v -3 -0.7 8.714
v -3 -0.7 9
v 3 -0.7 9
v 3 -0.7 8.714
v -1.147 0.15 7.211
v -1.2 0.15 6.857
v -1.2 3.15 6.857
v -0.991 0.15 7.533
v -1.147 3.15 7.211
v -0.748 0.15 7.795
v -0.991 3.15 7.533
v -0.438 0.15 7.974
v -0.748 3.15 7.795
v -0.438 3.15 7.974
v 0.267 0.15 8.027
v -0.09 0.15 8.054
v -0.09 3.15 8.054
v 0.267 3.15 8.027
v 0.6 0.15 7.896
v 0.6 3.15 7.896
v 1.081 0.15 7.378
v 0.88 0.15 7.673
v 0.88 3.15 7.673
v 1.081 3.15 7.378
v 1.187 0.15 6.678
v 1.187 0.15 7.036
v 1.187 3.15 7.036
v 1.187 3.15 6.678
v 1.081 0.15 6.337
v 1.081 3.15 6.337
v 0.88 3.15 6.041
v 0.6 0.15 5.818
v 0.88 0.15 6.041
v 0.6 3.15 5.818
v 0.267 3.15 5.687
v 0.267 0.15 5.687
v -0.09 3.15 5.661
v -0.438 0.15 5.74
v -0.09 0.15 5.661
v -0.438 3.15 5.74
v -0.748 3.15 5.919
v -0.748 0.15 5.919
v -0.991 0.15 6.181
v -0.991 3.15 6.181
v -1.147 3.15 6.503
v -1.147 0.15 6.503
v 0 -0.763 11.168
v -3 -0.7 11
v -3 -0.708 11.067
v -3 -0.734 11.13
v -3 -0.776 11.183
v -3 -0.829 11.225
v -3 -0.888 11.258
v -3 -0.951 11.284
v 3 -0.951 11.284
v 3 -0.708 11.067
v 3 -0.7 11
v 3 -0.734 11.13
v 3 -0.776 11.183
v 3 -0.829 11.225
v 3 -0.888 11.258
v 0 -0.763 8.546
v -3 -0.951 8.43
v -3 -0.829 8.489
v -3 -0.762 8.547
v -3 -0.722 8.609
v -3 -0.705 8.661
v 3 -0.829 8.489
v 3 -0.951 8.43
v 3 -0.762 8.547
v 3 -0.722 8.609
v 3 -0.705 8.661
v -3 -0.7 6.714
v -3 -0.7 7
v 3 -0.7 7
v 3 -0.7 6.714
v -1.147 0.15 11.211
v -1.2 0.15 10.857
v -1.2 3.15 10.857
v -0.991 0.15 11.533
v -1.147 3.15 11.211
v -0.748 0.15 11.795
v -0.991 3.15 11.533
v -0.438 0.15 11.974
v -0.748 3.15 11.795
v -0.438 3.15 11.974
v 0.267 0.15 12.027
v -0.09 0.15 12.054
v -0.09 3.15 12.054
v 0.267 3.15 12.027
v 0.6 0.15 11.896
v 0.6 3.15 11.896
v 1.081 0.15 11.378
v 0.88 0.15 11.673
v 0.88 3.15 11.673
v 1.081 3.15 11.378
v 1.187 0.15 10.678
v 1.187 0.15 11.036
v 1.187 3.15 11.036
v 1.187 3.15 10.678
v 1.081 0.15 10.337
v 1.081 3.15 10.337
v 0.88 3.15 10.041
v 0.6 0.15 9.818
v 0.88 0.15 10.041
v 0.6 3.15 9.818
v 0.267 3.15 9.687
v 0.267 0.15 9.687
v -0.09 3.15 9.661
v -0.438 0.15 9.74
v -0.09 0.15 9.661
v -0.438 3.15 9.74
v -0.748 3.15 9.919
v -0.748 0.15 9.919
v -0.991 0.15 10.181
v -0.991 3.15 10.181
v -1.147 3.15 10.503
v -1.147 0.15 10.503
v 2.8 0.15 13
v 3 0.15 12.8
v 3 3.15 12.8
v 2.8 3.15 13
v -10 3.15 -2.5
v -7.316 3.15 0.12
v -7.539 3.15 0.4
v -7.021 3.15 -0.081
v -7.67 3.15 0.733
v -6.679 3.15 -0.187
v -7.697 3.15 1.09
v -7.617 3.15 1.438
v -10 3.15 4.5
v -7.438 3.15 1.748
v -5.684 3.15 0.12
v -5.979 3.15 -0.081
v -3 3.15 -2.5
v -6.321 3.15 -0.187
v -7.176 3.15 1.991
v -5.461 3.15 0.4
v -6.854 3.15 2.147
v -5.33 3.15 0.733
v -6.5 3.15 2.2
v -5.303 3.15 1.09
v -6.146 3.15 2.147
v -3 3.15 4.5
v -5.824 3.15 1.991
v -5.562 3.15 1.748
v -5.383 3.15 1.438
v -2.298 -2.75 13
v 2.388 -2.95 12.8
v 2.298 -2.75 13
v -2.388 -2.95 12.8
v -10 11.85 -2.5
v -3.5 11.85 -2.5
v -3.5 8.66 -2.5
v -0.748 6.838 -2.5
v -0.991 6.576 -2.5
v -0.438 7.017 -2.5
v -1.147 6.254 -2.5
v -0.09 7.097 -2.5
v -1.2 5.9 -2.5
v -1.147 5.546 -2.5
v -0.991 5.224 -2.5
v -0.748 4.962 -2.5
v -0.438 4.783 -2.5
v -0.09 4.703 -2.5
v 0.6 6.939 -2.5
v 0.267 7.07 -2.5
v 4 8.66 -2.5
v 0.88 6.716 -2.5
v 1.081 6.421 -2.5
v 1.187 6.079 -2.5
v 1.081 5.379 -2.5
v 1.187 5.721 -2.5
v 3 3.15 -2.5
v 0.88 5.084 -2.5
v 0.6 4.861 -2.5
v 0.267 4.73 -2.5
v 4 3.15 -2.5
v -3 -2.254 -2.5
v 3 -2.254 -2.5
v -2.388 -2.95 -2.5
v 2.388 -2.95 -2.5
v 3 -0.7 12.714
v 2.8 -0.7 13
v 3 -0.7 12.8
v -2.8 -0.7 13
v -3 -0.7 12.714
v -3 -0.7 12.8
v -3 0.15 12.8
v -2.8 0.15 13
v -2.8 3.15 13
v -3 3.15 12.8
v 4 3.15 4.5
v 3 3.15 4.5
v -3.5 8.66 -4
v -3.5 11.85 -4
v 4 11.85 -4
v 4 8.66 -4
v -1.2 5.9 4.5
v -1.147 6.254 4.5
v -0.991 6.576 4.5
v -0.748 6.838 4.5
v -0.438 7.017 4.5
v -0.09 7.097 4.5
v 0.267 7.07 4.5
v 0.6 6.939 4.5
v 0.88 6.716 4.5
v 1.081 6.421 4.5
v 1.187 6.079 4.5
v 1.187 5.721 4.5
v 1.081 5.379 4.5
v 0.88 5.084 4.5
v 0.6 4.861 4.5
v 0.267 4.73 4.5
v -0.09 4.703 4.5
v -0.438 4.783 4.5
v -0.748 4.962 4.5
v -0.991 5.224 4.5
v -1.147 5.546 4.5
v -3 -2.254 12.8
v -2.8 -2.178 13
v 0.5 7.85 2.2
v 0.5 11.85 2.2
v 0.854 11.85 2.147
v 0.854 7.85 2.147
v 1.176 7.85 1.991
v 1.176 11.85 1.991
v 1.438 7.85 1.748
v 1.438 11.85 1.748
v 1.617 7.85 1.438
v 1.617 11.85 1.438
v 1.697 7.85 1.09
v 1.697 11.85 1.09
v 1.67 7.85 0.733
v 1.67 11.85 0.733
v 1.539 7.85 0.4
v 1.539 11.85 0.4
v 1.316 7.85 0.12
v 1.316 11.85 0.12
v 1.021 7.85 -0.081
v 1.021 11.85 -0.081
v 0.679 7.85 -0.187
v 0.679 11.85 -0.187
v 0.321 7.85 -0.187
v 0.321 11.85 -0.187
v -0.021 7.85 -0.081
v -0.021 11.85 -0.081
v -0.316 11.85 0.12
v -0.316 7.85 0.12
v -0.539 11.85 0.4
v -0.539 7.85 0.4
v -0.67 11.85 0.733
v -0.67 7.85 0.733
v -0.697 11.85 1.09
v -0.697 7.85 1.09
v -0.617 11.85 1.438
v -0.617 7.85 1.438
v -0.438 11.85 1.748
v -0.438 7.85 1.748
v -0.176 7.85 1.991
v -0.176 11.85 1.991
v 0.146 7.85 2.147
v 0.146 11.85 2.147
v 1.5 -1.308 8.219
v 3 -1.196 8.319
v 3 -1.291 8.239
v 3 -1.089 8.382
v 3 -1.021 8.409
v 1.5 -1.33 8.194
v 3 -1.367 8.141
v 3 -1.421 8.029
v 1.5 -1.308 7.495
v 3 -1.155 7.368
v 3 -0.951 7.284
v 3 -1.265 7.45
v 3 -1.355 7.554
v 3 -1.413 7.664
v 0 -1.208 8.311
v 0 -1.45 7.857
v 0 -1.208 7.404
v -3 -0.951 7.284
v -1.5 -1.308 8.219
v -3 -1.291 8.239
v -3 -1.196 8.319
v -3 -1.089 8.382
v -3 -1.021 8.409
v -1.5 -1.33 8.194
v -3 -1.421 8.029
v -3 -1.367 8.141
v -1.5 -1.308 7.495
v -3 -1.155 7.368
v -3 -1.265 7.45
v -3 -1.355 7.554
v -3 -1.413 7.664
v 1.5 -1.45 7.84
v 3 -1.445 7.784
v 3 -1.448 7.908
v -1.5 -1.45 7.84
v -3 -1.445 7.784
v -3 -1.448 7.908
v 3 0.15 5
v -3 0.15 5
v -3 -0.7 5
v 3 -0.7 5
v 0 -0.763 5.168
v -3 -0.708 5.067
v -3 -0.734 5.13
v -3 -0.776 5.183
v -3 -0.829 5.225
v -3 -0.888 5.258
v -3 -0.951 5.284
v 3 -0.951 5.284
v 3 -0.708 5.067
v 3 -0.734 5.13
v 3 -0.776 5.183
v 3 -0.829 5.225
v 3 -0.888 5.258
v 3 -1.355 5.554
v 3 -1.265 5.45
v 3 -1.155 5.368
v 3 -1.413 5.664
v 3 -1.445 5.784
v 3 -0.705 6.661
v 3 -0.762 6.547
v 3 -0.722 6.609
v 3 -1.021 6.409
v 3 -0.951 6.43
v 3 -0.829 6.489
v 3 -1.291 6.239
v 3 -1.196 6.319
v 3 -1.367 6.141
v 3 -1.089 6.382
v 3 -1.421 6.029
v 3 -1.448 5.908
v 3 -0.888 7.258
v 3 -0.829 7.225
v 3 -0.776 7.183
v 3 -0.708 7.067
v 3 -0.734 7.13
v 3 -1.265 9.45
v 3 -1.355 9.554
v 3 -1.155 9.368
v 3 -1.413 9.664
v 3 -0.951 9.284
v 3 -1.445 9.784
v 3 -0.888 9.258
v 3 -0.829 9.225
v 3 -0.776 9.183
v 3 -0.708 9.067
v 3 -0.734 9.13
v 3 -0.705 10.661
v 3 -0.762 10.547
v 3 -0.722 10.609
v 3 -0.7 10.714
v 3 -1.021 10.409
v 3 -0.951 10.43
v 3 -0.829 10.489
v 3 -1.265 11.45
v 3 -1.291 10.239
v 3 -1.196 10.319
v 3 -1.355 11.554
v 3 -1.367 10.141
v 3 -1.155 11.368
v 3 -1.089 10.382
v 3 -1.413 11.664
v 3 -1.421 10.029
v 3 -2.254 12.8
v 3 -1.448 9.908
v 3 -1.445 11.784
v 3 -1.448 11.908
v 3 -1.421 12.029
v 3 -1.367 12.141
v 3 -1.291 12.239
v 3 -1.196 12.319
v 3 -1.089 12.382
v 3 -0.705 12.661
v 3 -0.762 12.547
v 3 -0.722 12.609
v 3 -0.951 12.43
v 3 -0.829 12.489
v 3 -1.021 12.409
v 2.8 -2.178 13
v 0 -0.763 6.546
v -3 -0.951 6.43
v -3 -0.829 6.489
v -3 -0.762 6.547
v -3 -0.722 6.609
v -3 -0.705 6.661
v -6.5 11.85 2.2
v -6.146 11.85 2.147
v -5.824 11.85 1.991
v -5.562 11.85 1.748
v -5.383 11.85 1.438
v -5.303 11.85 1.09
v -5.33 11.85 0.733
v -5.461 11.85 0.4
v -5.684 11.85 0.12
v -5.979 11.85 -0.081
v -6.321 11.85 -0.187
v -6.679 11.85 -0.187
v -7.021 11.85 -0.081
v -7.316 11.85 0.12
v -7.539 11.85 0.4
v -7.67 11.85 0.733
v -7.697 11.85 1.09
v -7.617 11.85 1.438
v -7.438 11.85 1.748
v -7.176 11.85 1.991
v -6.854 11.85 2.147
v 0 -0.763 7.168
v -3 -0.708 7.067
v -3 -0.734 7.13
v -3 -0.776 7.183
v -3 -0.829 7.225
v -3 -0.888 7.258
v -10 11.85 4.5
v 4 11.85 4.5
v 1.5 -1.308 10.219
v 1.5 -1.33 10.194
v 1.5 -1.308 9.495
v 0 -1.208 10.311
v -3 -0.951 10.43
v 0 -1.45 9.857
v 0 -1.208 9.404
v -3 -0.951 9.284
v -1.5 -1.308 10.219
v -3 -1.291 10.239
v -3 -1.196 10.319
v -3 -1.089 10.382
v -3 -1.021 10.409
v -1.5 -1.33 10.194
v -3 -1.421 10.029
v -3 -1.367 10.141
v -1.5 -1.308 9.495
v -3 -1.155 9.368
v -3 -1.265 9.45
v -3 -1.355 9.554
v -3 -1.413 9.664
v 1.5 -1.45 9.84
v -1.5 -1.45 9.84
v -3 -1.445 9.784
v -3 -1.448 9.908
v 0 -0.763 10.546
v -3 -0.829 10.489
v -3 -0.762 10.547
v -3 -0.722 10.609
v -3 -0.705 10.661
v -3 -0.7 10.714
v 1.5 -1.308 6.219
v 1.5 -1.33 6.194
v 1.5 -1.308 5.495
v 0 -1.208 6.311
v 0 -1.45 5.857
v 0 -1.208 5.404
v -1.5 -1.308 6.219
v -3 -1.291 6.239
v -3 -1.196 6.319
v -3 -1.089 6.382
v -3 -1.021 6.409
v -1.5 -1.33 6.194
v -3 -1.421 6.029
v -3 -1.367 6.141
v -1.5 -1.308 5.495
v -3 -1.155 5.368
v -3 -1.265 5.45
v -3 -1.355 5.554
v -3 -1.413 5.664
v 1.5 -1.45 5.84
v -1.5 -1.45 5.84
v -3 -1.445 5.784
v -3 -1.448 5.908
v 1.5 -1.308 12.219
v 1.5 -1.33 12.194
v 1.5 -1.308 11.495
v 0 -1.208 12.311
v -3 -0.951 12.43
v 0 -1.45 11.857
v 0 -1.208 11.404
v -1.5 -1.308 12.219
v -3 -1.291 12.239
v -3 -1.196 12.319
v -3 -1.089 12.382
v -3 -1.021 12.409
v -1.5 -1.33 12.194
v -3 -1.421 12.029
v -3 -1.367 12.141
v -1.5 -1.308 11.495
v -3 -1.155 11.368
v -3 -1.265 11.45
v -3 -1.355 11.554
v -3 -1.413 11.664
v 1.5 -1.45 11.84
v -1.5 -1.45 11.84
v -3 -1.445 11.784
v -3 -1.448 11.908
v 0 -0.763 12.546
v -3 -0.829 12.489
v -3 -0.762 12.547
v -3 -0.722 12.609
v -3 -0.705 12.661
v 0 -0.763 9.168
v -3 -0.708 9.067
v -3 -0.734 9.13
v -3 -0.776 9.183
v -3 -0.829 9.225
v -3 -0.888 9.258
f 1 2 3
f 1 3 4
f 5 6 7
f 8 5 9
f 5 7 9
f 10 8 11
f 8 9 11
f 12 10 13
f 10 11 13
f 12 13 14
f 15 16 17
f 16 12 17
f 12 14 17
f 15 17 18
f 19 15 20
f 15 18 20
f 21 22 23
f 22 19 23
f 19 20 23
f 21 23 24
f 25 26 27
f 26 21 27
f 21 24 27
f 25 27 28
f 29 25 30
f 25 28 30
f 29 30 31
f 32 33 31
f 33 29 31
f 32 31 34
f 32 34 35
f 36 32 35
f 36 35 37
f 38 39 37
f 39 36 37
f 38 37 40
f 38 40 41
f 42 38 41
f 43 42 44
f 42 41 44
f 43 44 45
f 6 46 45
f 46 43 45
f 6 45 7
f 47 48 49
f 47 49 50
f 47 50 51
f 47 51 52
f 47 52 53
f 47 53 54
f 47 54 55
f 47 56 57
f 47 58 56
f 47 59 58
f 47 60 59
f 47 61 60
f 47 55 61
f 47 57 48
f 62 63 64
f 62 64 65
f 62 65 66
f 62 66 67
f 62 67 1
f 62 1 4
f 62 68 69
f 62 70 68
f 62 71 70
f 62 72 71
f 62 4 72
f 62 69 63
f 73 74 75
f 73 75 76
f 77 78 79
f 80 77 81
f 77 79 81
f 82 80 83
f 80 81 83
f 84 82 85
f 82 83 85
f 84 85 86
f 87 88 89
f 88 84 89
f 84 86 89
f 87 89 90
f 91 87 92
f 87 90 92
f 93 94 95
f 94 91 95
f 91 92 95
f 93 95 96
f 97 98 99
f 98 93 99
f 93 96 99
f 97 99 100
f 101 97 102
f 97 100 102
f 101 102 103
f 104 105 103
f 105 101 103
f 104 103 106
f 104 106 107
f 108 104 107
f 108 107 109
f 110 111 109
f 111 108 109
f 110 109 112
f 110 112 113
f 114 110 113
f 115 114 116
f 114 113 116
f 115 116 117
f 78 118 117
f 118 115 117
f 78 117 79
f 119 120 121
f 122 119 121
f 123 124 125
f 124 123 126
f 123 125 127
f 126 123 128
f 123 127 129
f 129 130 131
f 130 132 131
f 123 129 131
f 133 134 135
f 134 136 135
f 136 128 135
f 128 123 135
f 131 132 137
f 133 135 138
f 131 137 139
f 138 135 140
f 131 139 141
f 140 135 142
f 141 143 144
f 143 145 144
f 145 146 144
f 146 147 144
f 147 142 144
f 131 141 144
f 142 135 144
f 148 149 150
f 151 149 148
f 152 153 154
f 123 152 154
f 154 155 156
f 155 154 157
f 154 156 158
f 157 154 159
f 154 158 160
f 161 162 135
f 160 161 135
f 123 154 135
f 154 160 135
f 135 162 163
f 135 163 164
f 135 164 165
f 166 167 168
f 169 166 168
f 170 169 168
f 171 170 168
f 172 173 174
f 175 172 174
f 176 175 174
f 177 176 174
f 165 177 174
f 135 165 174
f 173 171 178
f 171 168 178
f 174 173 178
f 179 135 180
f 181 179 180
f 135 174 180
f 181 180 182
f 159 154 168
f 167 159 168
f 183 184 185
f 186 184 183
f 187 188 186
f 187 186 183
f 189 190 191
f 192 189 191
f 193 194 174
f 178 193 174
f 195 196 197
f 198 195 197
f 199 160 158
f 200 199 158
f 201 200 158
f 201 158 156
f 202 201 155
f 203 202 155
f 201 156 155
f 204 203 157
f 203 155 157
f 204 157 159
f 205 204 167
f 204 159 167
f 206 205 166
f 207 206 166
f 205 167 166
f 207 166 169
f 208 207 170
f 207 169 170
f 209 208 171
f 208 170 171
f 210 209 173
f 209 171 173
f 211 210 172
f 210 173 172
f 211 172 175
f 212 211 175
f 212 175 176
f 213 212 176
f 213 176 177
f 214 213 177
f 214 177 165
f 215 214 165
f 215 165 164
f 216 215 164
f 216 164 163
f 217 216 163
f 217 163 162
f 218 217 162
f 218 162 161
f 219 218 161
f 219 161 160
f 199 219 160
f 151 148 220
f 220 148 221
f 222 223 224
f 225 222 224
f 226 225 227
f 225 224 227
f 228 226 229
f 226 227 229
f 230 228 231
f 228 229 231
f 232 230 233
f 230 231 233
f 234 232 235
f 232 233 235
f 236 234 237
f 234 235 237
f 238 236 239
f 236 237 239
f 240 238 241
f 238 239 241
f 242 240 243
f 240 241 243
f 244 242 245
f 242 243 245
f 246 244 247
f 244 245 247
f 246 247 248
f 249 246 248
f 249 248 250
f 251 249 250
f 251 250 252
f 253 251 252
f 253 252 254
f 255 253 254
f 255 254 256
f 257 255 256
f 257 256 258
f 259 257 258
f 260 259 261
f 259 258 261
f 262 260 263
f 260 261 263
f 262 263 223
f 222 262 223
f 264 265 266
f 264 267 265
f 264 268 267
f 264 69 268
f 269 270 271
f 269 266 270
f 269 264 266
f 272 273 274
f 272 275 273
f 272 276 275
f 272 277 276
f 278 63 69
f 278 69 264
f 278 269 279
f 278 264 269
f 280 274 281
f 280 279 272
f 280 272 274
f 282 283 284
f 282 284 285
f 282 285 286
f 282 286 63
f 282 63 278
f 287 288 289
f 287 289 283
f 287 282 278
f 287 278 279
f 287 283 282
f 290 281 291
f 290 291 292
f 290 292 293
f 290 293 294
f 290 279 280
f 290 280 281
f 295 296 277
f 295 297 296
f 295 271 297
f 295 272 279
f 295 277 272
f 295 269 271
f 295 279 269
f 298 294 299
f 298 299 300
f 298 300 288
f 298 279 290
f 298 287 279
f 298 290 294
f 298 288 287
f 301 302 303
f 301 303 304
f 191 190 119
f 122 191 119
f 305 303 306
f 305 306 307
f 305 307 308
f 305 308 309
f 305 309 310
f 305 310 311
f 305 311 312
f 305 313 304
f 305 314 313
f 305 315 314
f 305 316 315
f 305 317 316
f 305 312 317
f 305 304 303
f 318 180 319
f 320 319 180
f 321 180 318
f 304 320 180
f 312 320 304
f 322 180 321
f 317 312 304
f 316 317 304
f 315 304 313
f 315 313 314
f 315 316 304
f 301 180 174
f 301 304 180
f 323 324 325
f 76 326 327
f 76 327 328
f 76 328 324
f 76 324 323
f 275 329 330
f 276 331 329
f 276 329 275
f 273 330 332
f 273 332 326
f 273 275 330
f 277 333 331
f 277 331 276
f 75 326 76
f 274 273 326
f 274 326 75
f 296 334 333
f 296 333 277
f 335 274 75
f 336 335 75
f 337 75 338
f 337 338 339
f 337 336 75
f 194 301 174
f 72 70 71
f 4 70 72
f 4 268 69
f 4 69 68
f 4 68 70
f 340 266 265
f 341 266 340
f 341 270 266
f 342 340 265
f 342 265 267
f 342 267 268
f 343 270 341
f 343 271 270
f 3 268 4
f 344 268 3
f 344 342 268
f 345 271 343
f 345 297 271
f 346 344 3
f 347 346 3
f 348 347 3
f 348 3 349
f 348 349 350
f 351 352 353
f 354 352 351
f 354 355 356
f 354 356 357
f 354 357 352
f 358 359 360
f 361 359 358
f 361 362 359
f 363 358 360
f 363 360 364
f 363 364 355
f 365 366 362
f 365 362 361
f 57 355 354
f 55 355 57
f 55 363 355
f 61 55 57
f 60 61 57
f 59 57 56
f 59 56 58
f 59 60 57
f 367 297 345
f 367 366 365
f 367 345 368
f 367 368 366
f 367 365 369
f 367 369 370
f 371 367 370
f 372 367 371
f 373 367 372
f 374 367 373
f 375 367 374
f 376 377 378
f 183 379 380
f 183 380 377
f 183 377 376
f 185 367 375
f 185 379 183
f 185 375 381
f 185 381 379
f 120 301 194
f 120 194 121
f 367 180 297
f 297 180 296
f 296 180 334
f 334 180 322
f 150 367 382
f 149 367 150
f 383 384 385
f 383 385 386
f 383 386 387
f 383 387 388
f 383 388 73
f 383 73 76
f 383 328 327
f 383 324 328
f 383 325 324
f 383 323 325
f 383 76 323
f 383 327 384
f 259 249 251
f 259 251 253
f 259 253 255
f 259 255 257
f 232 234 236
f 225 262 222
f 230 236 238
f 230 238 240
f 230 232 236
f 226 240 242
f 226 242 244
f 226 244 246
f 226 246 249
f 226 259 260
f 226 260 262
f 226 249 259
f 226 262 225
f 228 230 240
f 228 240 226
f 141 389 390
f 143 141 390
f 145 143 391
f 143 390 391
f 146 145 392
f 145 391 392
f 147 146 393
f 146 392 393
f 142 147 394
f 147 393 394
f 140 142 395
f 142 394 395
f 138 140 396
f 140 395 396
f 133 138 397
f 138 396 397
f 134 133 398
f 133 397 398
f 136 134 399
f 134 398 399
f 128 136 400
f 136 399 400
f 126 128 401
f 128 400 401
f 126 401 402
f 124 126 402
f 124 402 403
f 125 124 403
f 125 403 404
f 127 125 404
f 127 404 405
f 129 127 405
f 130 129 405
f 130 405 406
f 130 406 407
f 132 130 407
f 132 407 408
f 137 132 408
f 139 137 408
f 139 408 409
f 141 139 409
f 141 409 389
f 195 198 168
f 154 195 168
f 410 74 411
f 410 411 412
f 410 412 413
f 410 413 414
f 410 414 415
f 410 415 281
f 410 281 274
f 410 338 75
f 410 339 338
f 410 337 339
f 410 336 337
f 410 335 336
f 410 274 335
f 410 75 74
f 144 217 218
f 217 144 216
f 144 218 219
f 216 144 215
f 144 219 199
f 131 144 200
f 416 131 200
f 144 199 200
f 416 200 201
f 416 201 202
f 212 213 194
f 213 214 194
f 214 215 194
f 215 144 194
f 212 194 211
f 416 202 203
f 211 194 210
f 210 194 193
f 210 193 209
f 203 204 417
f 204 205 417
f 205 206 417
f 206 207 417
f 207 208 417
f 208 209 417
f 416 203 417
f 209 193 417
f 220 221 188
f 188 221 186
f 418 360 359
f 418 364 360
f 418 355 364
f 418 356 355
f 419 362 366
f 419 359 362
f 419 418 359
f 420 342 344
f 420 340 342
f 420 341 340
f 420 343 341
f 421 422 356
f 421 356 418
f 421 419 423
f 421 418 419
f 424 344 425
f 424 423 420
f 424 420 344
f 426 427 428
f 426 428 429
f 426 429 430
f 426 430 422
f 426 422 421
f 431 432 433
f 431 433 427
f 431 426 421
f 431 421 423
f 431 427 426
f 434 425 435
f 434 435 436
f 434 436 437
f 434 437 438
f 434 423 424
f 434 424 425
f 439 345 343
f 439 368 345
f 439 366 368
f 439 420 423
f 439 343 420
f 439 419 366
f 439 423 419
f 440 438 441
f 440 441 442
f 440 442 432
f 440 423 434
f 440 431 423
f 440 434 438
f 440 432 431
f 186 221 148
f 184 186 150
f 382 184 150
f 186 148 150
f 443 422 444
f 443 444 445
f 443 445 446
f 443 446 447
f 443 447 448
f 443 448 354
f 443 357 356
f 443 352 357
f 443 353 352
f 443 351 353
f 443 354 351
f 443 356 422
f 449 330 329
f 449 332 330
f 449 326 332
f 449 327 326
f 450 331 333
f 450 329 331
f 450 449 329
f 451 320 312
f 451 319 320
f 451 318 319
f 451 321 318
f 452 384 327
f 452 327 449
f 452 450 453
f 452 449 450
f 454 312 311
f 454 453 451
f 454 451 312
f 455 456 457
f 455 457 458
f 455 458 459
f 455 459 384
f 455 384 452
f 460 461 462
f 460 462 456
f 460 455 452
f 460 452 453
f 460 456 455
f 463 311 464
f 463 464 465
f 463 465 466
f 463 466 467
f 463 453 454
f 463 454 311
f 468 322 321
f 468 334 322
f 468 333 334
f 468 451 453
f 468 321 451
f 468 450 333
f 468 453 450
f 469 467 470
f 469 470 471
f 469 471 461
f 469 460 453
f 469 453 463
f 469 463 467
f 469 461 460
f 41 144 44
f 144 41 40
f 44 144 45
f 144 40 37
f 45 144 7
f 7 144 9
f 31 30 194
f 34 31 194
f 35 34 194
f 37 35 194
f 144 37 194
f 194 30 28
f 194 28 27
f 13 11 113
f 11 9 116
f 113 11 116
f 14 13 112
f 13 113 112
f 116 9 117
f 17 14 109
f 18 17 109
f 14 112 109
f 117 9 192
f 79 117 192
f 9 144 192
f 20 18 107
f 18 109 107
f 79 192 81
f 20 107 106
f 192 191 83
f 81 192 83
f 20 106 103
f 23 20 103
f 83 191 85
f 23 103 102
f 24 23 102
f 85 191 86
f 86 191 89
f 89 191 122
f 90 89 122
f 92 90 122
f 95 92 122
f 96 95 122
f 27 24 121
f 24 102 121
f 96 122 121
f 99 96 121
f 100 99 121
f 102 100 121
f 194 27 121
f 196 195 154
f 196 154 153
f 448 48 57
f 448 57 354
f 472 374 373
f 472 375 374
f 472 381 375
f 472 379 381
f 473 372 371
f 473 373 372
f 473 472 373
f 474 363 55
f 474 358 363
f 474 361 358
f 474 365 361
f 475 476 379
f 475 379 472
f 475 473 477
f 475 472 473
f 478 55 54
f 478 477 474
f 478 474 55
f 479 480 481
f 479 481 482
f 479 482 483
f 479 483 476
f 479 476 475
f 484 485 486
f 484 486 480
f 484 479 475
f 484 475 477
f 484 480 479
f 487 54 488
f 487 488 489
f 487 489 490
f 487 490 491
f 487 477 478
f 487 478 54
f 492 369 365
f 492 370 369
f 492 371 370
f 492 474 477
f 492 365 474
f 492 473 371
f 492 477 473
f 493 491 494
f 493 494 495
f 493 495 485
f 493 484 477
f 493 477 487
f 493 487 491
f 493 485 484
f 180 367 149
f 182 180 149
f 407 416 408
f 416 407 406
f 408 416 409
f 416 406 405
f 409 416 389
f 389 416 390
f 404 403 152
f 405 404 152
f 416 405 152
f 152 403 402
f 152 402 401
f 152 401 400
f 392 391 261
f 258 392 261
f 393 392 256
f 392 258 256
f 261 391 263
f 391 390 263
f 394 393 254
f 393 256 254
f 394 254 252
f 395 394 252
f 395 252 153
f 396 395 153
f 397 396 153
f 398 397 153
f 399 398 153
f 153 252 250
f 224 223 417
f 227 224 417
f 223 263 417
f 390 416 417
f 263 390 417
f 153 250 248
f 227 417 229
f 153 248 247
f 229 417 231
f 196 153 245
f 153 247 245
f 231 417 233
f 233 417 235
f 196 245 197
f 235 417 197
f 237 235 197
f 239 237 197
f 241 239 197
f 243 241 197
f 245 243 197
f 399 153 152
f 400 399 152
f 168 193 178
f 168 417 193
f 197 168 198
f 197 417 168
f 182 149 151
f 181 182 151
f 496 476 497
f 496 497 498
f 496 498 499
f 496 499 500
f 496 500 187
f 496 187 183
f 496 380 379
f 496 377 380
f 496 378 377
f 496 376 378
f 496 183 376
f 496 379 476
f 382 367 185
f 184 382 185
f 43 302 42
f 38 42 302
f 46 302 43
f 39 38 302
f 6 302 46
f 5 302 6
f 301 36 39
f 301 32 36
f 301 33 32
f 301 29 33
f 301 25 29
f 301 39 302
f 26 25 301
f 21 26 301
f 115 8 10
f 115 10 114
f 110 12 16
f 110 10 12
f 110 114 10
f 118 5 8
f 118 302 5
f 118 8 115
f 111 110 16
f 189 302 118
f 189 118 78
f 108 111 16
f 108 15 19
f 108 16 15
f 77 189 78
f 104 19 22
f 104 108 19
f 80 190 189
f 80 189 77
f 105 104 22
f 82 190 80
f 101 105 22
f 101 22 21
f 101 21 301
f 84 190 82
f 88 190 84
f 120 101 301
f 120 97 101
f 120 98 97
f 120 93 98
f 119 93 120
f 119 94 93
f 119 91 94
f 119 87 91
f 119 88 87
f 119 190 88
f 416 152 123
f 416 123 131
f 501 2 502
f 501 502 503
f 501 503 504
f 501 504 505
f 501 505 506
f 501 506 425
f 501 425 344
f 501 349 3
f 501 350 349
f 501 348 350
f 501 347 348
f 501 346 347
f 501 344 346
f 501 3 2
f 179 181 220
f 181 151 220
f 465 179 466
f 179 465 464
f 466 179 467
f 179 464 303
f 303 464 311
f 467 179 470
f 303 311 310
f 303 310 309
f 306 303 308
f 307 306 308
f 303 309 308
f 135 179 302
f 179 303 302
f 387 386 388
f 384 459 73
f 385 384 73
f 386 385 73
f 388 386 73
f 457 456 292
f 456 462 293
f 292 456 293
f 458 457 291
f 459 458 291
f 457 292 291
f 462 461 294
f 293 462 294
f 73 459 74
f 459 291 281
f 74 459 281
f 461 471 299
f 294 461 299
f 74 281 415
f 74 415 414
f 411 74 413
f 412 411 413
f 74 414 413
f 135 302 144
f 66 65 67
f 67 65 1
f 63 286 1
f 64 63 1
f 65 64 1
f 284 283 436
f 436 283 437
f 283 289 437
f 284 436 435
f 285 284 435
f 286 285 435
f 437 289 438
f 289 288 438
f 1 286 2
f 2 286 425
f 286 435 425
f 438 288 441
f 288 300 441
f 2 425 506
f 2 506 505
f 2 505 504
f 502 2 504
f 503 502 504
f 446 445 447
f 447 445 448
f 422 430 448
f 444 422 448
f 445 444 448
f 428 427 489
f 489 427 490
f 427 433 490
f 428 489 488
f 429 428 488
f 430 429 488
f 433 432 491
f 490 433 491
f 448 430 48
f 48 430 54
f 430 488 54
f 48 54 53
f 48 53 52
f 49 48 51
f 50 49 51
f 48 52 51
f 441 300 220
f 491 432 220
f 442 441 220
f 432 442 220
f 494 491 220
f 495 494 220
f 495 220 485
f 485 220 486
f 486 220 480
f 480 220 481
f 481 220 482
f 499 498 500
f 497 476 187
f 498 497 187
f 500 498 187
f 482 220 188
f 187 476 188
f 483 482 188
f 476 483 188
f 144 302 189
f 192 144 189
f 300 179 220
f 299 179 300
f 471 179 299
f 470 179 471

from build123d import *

# Parameters (mm, degrees)
BOSS_EXTRUDE1_DEPTH     = 13
SKETCH6_W               = 6
SKETCH6_H               = 5
BOSS_EXTRUDE4_DEPTH     = 5.6
SKETCH16_W              = 6
SKETCH16_H              = 8
BOSS_EXTRUDE5_DEPTH     = 0.1
CUT_EXTRUDE6_DEPTH      = 4
CUT_EXTRUDE6_DEPTH_BACK = 3.6
SKETCH15_R              = 1.2
CUT_EXTRUDE7_DEPTH      = 8.7202
CUT_EXTRUDE8_START      = -0.2202
SKETCH19_W              = 6
SKETCH19_H              = 8
SKETCH19_R              = 1.2
CUT_EXTRUDE8_DEPTH      = 0.2202
SKETCH12_R              = 1.2
CUT_EXTRUDE5_DEPTH      = 6
CHAMFER1_SIZE           = 0.2
SKETCH21_R              = 1.2
BOSS_EXTRUDE6_DEPTH     = 2.5
SKETCH24_W              = 6
SKETCH24_H              = 5.5
CUT_EXTRUDE10_DEPTH     = 8.5
SKETCH25_W              = 6
SKETCH25_H              = 7
BOSS_EXTRUDE8_DEPTH     = 12.9
SKETCH26_W              = 6
SKETCH26_H              = 7.39
BOSS_EXTRUDE9_DEPTH     = 3
SKETCH30_R              = 1.2
CUT_EXTRUDE13_DEPTH     = 8
SKETCH31_W              = 7
SKETCH31_H              = 9
BOSS_EXTRUDE11_DEPTH    = 1
SKETCH32_W              = 7
SKETCH32_H              = 9
BOSS_EXTRUDE12_DEPTH    = 1
BOSS_EXTRUDE13_DEPTH    = 1
BOSS_EXTRUDE14_DEPTH    = 1
SKETCH35_W              = 10
SKETCH35_H              = 4.2
CUT_EXTRUDE14_DEPTH     = 10
BOSS_EXTRUDE15_DEPTH    = 6
SKETCH38_R              = 1.2
CUT_EXTRUDE15_DEPTH     = 4
SKETCH39_R              = 1.2
CUT_EXTRUDE16_DEPTH     = 10
SKETCH40_W              = 14
SKETCH40_H              = 1.5
CUT_EXTRUDE17_DEPTH     = 10
SKETCH41_W              = 6.5
SKETCH41_H              = 3.19
CUT_EXTRUDE18_DEPTH     = 1.5


with BuildPart() as part:
    # Sketch1 → Boss-Extrude1 (new body)
    with BuildSketch(Plane.XY):
        Polygon((3, 3.05), (3, -2.253801214), (2.388188946, -2.95), (-2.388188946, -2.95), (-3, -2.253801214), (-3, 3.05), align=None)
    extrude(amount=BOSS_EXTRUDE1_DEPTH)

    # Sketch6 → Boss-Extrude4 (add)
    with BuildSketch(Plane(origin=(0, 3.05, 0), x_dir=(1, 0, 0), z_dir=(0, 1, 0))):
        with Locations((0, -2.5)):
            Rectangle(SKETCH6_W, SKETCH6_H)
    extrude(amount=BOSS_EXTRUDE4_DEPTH)

    # Sketch16 → Boss-Extrude5 (add)
    with BuildSketch(Plane(origin=(0, 3.05, 0), x_dir=(1, 0, 0), z_dir=(0, 1, 0))):
        with Locations((0, -9)):
            Rectangle(SKETCH16_W, SKETCH16_H)
    extrude(amount=BOSS_EXTRUDE5_DEPTH)

    # Sketch18 → Cut-Extrude6 (cut, two sides: drawn at the far end of the back side and taken through both)
    with BuildSketch(Plane(origin=(0, 0, 0), x_dir=(0, 0, -1), z_dir=(1, 0, 0)).offset(-CUT_EXTRUDE6_DEPTH_BACK)):
        with BuildLine():
            Line((-8.8572, -0.0702), (-12.8572, -0.0702))
            Line((-12.8572, -0.0702), (-13, -0.0702))
            Line((-13, -0.0702), (-13, -0.7))
            Line((-13, -0.7), (-12.8572, -0.7))
            Line((-12.8572, -0.7), (-12.7144, -0.7))
            add(Edge.make_bspline(
                [(-12.7144, -0.7), (-12.5198, -0.7), (-12.43, -0.9509)],
                knots=[0.103448276, 0.103448276, 0.103448276, 0.137931034, 0.137931034, 0.137931034], degree=2))
            add(Edge.make_bspline(
                [(-12.43, -0.9509), (-12.3594, -1.2388), (-12.13, -1.45), (-11.8572, -1.45)],
                knots=[0.137931034, 0.137931034, 0.137931034, 0.137931034, 0.172413793, 0.172413793, 0.172413793, 0.172413793], degree=3))
            add(Edge.make_bspline(
                [(-11.8572, -1.45), (-11.5844, -1.45), (-11.355, -1.2388), (-11.2844, -0.9509)],
                knots=[0.172413793, 0.172413793, 0.172413793, 0.172413793, 0.206896552, 0.206896552, 0.206896552, 0.206896552], degree=3))
            add(Edge.make_bspline(
                [(-11.2844, -0.9509), (-11.1946, -0.7), (-11, -0.7)],
                knots=[0.206896552, 0.206896552, 0.206896552, 0.24137931, 0.24137931, 0.24137931], degree=2))
            Line((-11, -0.7), (-10.8572, -0.7))
            Line((-10.8572, -0.7), (-10.7144, -0.7))
            add(Edge.make_bspline(
                [(-10.7144, -0.7), (-10.5198, -0.7), (-10.43, -0.9509)],
                knots=[0.310344828, 0.310344828, 0.310344828, 0.344827586, 0.344827586, 0.344827586], degree=2))
            add(Edge.make_bspline(
                [(-10.43, -0.9509), (-10.3594, -1.2388), (-10.13, -1.45), (-9.8572, -1.45)],
                knots=[0.344827586, 0.344827586, 0.344827586, 0.344827586, 0.379310345, 0.379310345, 0.379310345, 0.379310345], degree=3))
            add(Edge.make_bspline(
                [(-9.8572, -1.45), (-9.5844, -1.45), (-9.355, -1.2388), (-9.2844, -0.9509)],
                knots=[0.379310345, 0.379310345, 0.379310345, 0.379310345, 0.413793103, 0.413793103, 0.413793103, 0.413793103], degree=3))
            add(Edge.make_bspline(
                [(-9.2844, -0.9509), (-9.1946, -0.7), (-9, -0.7)],
                knots=[0.413793103, 0.413793103, 0.413793103, 0.448275862, 0.448275862, 0.448275862], degree=2))
            Line((-9, -0.7), (-8.8572, -0.7))
            Line((-8.8572, -0.7), (-8.7144, -0.7))
            add(Edge.make_bspline(
                [(-8.7144, -0.7), (-8.5198, -0.7), (-8.43, -0.9509)],
                knots=[0.517241379, 0.517241379, 0.517241379, 0.551724138, 0.551724138, 0.551724138], degree=2))
            add(Edge.make_bspline(
                [(-8.43, -0.9509), (-8.3594, -1.2388), (-8.13, -1.45), (-7.8572, -1.45)],
                knots=[0.551724138, 0.551724138, 0.551724138, 0.551724138, 0.586206897, 0.586206897, 0.586206897, 0.586206897], degree=3))
            add(Edge.make_bspline(
                [(-7.8572, -1.45), (-7.5844, -1.45), (-7.355, -1.2388), (-7.2844, -0.9509)],
                knots=[0.586206897, 0.586206897, 0.586206897, 0.586206897, 0.620689655, 0.620689655, 0.620689655, 0.620689655], degree=3))
            add(Edge.make_bspline(
                [(-7.2844, -0.9509), (-7.1946, -0.7), (-7, -0.7)],
                knots=[0.620689655, 0.620689655, 0.620689655, 0.655172414, 0.655172414, 0.655172414], degree=2))
            Line((-7, -0.7), (-6.8572, -0.7))
            Line((-6.8572, -0.7), (-6.7144, -0.7))
            add(Edge.make_bspline(
                [(-6.7144, -0.7), (-6.5198, -0.7), (-6.43, -0.9509)],
                knots=[0.724137931, 0.724137931, 0.724137931, 0.75862069, 0.75862069, 0.75862069], degree=2))
            add(Edge.make_bspline(
                [(-6.43, -0.9509), (-6.3594, -1.2388), (-6.13, -1.45), (-5.8572, -1.45)],
                knots=[0.75862069, 0.75862069, 0.75862069, 0.75862069, 0.793103448, 0.793103448, 0.793103448, 0.793103448], degree=3))
            add(Edge.make_bspline(
                [(-5.8572, -1.45), (-5.5844, -1.45), (-5.355, -1.2388), (-5.2844, -0.9509)],
                knots=[0.793103448, 0.793103448, 0.793103448, 0.793103448, 0.827586207, 0.827586207, 0.827586207, 0.827586207], degree=3))
            add(Edge.make_bspline(
                [(-5.2844, -0.9509), (-5.1946, -0.7), (-5, -0.7)],
                knots=[0.827586207, 0.827586207, 0.827586207, 0.862068966, 0.862068966, 0.862068966], degree=2))
            Line((-5, -0.7), (-5, -0.0702))
            Line((-5, -0.0702), (-8.8572, -0.0702))
        make_face()
    extrude(amount=CUT_EXTRUDE6_DEPTH + CUT_EXTRUDE6_DEPTH_BACK, mode=Mode.SUBTRACT)

    # Sketch15 → Cut-Extrude7 (cut)
    with BuildSketch(Plane(origin=(0, 8.65, 0), x_dir=(1, 0, 0), z_dir=(0, 1, 0))):
        with Locations(Location((0, -10.8572, 0), (0, 0, 180))):
            Circle(SKETCH15_R)
        with Locations(Location((0, -6.8572, 0), (0, 0, 180))):
            Circle(SKETCH15_R)
    extrude(amount=-CUT_EXTRUDE7_DEPTH, mode=Mode.SUBTRACT)

    # Sketch19 → Cut-Extrude8 (cut)
    with BuildSketch(Plane.XZ.offset(0.0702).offset(CUT_EXTRUDE8_START)):
        with Locations((0, 9)):
            Rectangle(SKETCH19_W, SKETCH19_H)
        with Locations(Location((0, 10.8572, 0), (0, 0, 180))):
            Circle(SKETCH19_R, mode=Mode.SUBTRACT)
        with Locations(Location((0, 6.8572, 0), (0, 0, 180))):
            Circle(SKETCH19_R, mode=Mode.SUBTRACT)
    extrude(amount=CUT_EXTRUDE8_DEPTH, mode=Mode.SUBTRACT)

    # Sketch12 → Cut-Extrude5 (cut)
    with BuildSketch(Plane.XY.offset(5)):
        with Locations((0, 5.85)):
            Circle(SKETCH12_R)
    extrude(amount=-CUT_EXTRUDE5_DEPTH, mode=Mode.SUBTRACT)

    # Chamfer1
    chamfer1_edges = [part.edges().sort_by_distance(p)[0] for p in [
        (-2.694094473, -2.601900607, 13),
        (0, -2.95, 13),
        (2.694094473, -2.601900607, 13),
        (3, 1.65, 13),
        (3, -1.476900607, 13),
        (-3, -1.476900607, 13),
        (-3, 1.65, 13),
    ]]
    chamfer(chamfer1_edges, length=CHAMFER1_SIZE)

    # Sketch21 → Boss-Extrude6 (add)
    with BuildSketch(Plane(origin=(0, 0, 0), x_dir=(-1, 0, 0), z_dir=(0, 0, -1))):
        Polygon((-2.388188946, -2.95), (2.388188946, -2.95), (3, -2.253801214), (3, 8.65), (-3, 8.65), (-3, -2.253801214), align=None)
        with Locations(Location((0, 5.85, 0), (0, 0, 180))):
            Circle(SKETCH21_R, mode=Mode.SUBTRACT)
    extrude(amount=BOSS_EXTRUDE6_DEPTH)

    # Sketch24 → Cut-Extrude10 (cut)
    with BuildSketch(Plane.XY.offset(5)):
        with Locations((0, 5.9)):
            Rectangle(SKETCH24_W, SKETCH24_H)
    extrude(amount=-CUT_EXTRUDE10_DEPTH, mode=Mode.SUBTRACT)

    # Sketch25 → Boss-Extrude8 (add)
    with BuildSketch(Plane(origin=(0, 3.15, 0), x_dir=(1, 0, 0), z_dir=(0, 1, 0))):
        with Locations((0, -1)):
            Rectangle(SKETCH25_W, SKETCH25_H)
    extrude(amount=BOSS_EXTRUDE8_DEPTH)

    # Sketch26 → Boss-Extrude9 (add)
    with BuildSketch(Plane(origin=(0, 0, -2.5), x_dir=(-1, 0, 0), z_dir=(0, 0, -1))):
        with Locations((0, 12.355)):
            Rectangle(SKETCH26_W, SKETCH26_H)
    extrude(amount=BOSS_EXTRUDE9_DEPTH)

    # Sketch30 → Cut-Extrude13 (cut)
    with BuildSketch(Plane(origin=(0, 0, -2.5), x_dir=(-1, 0, 0), z_dir=(0, 0, -1))):
        with Locations((0, 5.9)):
            Circle(SKETCH30_R)
    extrude(amount=-CUT_EXTRUDE13_DEPTH, mode=Mode.SUBTRACT)

    # Sketch31 → Boss-Extrude11 (add)
    with BuildSketch(Plane(origin=(3, 0, 0), x_dir=(0, 0, -1), z_dir=(1, 0, 0))):
        with Locations((-1, 7.65)):
            Rectangle(SKETCH31_W, SKETCH31_H)
    extrude(amount=BOSS_EXTRUDE11_DEPTH)

    # Sketch32 → Boss-Extrude12 (add)
    with BuildSketch(Plane.ZY.offset(3)):
        with Locations((1, 7.65)):
            Rectangle(SKETCH32_W, SKETCH32_H)
    extrude(amount=BOSS_EXTRUDE12_DEPTH)

    # Sketch33 → Boss-Extrude13 (add)
    with BuildSketch(Plane(origin=(3, 0, 0), x_dir=(0, 0, -1), z_dir=(1, 0, 0))):
        Polygon((2.5, 12.15), (2.5, 8.66), (5.5, 8.66), (5.5, 16.05), (-4.5, 16.05), (-4.5, 12.15), align=None)
    extrude(amount=BOSS_EXTRUDE13_DEPTH)

    # Sketch34 → Boss-Extrude14 (add)
    with BuildSketch(Plane.ZY.offset(3)):
        Polygon((-2.5, 12.15), (4.5, 12.15), (4.5, 16.05), (-5.5, 16.05), (-5.5, 8.66), (-2.5, 8.66), align=None)
    extrude(amount=BOSS_EXTRUDE14_DEPTH)

    # Sketch35 → Cut-Extrude14 (cut)
    with BuildSketch(Plane.ZY.offset(4)):
        with Locations((-0.5, 13.95)):
            Rectangle(SKETCH35_W, SKETCH35_H)
    extrude(amount=-CUT_EXTRUDE14_DEPTH, mode=Mode.SUBTRACT)

    # Sketch36 → Boss-Extrude15 (add)
    with BuildSketch(Plane.ZY.offset(4)):
        Polygon((4.5, 3.15), (4.5, 11.85), (-5.5, 11.85), (-5.5, 8.66), (-2.5, 8.66), (-2.5, 3.15), align=None)
    extrude(amount=BOSS_EXTRUDE15_DEPTH)

    # Sketch38 → Cut-Extrude15 (cut)
    with BuildSketch(Plane(origin=(0, 11.85, 0), x_dir=(1, 0, 0), z_dir=(0, 1, 0))):
        with Locations(Location((0.5, -1, 0), (0, 0, 270))):
            Circle(SKETCH38_R)
    extrude(amount=-CUT_EXTRUDE15_DEPTH, mode=Mode.SUBTRACT)

    # Sketch39 → Cut-Extrude16 (cut)
    with BuildSketch(Plane(origin=(0, 11.85, 0), x_dir=(1, 0, 0), z_dir=(0, 1, 0))):
        with Locations(Location((-6.5, -1, 0), (0, 0, 270))):
            Circle(SKETCH39_R)
    extrude(amount=-CUT_EXTRUDE16_DEPTH, mode=Mode.SUBTRACT)

    # Sketch40 → Cut-Extrude17 (cut)
    with BuildSketch(Plane(origin=(0, 11.85, 0), x_dir=(1, 0, 0), z_dir=(0, 1, 0))):
        with Locations((-3, 4.75)):
            Rectangle(SKETCH40_W, SKETCH40_H)
    extrude(amount=-CUT_EXTRUDE17_DEPTH, mode=Mode.SUBTRACT)

    # Sketch41 → Cut-Extrude18 (cut)
    with BuildSketch(Plane(origin=(0, 0, -4), x_dir=(-1, 0, 0), z_dir=(0, 0, -1))):
        with Locations((6.75, 10.255)):
            Rectangle(SKETCH41_W, SKETCH41_H)
    extrude(amount=-CUT_EXTRUDE18_DEPTH, mode=Mode.SUBTRACT)


solid = part.part
